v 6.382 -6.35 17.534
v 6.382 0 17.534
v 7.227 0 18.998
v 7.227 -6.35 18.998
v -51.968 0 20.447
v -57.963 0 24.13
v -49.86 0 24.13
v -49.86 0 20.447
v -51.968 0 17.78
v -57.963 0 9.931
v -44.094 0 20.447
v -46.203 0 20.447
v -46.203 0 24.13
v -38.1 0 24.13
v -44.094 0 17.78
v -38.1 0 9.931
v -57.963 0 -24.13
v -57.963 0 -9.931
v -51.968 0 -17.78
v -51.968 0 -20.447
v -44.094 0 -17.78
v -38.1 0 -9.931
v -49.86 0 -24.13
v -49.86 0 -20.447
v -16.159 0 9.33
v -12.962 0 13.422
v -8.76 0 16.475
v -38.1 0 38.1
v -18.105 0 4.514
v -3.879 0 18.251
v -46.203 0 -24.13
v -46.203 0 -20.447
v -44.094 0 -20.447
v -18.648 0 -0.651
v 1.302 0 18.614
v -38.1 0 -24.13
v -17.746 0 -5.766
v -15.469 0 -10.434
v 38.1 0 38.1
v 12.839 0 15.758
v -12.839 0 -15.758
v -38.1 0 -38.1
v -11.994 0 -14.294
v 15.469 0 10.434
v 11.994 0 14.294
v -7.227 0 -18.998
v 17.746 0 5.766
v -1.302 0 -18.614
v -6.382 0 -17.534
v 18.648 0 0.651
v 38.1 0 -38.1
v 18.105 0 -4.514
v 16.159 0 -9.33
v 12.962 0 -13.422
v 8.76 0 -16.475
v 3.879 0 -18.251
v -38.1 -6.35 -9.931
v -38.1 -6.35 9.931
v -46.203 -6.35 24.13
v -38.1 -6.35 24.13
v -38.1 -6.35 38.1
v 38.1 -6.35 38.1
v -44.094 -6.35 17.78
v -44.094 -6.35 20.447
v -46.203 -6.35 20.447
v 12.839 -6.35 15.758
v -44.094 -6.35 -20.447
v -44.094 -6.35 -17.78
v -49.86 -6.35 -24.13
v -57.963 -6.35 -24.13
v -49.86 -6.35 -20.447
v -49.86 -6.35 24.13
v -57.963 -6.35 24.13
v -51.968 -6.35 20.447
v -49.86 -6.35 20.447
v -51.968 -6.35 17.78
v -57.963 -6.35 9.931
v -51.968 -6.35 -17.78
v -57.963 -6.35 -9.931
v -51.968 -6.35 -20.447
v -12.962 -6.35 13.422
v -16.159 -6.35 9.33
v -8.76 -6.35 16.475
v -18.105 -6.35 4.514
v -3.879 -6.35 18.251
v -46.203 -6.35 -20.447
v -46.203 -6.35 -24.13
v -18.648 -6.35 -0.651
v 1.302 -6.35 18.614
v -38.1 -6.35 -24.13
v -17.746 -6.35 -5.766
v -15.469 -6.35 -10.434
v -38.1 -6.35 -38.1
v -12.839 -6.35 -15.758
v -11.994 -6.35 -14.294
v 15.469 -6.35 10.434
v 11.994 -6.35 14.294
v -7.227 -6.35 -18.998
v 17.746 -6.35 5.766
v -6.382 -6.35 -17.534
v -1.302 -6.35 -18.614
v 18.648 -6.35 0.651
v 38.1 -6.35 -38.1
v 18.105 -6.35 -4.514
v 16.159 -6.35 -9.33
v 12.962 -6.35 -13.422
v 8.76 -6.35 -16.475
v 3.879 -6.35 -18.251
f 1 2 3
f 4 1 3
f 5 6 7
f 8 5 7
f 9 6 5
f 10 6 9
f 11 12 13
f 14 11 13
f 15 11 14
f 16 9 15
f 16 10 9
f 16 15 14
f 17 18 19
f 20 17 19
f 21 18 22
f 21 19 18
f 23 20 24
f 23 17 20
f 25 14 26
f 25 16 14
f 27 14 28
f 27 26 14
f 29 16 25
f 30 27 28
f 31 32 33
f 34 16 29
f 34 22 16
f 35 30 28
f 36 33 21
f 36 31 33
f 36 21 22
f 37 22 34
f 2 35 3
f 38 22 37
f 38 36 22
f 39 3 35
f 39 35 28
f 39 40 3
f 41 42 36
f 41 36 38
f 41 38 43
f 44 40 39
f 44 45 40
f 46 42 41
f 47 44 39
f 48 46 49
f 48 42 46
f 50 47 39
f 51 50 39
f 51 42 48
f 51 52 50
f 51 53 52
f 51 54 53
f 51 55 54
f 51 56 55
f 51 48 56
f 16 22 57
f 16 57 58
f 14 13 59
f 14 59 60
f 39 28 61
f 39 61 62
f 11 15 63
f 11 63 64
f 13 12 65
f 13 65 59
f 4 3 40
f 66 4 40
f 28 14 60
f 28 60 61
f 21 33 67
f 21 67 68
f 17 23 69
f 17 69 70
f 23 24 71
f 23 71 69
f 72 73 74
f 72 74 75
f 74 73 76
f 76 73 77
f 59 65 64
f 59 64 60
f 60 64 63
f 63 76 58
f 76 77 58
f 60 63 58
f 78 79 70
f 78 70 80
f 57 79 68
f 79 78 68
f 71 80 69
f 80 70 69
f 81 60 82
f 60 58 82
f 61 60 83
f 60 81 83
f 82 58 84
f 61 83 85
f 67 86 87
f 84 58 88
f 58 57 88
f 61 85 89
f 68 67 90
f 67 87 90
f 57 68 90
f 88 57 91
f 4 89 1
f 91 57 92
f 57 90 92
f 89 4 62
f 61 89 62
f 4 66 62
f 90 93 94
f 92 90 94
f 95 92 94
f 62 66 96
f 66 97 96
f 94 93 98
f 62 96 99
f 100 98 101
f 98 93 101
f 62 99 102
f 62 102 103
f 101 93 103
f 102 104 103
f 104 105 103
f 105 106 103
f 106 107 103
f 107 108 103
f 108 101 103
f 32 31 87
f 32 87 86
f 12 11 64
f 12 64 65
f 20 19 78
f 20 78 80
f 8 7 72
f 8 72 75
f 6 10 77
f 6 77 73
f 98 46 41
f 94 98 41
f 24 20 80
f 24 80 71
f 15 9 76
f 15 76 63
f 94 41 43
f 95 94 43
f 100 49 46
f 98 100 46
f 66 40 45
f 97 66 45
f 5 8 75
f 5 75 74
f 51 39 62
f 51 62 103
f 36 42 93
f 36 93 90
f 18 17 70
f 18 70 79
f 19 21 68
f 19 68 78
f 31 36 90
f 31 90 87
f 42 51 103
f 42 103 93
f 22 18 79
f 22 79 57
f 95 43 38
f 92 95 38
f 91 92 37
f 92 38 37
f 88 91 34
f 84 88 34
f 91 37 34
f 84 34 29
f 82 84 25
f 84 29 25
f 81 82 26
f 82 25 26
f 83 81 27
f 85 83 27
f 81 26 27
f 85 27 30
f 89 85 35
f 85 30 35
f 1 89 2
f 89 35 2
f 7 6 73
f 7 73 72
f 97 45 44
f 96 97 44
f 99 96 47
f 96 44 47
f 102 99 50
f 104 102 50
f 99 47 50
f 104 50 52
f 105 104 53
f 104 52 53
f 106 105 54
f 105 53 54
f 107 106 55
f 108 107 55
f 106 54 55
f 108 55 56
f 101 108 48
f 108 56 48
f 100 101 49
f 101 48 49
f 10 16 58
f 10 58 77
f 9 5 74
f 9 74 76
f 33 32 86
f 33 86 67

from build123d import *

# Parameters (mm, degrees)
BOSS_EXTRUDE1_DEPTH = 6.35


with BuildPart() as part:
    # Sketch1 → Boss-Extrude1 (new body)
    with BuildSketch(Plane(origin=(0, 0, 0), x_dir=(1, 0, 0), z_dir=(0, 1, 0))):
        Polygon((-38.1, -38.1), (38.1, -38.1), (38.1, 38.1), (-38.1, 38.1), (-38.1, 24.13), (-46.2026, 24.13), (-46.2026, 20.447), (-44.0944, 20.447), (-44.0944, 17.78), (-51.9684, 17.78), (-51.9684, 20.447), (-49.8602, 20.447), (-49.8602, 24.13), (-57.9628, 24.13), (-57.9628, 9.9314), (-38.1, 9.9314), (-38.1, -9.9314), (-57.9628, -9.9314), (-57.9628, -24.13), (-49.8602, -24.13), (-49.8602, -20.447), (-51.9684, -20.447), (-51.9684, -17.78), (-44.0944, -17.78), (-44.0944, -20.447), (-46.2026, -20.447), (-46.2026, -24.13), (-38.1, -24.13), align=None)
        with BuildLine():
            Line((7.227071664, -18.99759929), (12.838867764, -15.757627301))
            Line((12.838867764, -15.757627301), (11.99371709, -14.293783392))
            ThreePointArc((11.99371709, -14.293783392), (16.159242555, 9.329543039), (-6.381920989, 17.533755382))
            Line((-6.381920989, 17.533755382), (-7.227071664, 18.99759929))
            Line((-7.227071664, 18.99759929), (-12.838867764, 15.757627301))
            Line((-12.838867764, 15.757627301), (-11.99371709, 14.293783392))
            ThreePointArc((-11.99371709, 14.293783392), (-16.159242555, -9.329543039), (6.381920989, -17.533755382))
            Line((6.381920989, -17.533755382), (7.227071664, -18.99759929))
        make_face(mode=Mode.SUBTRACT)
    extrude(amount=-BOSS_EXTRUDE1_DEPTH)


solid = part.part
